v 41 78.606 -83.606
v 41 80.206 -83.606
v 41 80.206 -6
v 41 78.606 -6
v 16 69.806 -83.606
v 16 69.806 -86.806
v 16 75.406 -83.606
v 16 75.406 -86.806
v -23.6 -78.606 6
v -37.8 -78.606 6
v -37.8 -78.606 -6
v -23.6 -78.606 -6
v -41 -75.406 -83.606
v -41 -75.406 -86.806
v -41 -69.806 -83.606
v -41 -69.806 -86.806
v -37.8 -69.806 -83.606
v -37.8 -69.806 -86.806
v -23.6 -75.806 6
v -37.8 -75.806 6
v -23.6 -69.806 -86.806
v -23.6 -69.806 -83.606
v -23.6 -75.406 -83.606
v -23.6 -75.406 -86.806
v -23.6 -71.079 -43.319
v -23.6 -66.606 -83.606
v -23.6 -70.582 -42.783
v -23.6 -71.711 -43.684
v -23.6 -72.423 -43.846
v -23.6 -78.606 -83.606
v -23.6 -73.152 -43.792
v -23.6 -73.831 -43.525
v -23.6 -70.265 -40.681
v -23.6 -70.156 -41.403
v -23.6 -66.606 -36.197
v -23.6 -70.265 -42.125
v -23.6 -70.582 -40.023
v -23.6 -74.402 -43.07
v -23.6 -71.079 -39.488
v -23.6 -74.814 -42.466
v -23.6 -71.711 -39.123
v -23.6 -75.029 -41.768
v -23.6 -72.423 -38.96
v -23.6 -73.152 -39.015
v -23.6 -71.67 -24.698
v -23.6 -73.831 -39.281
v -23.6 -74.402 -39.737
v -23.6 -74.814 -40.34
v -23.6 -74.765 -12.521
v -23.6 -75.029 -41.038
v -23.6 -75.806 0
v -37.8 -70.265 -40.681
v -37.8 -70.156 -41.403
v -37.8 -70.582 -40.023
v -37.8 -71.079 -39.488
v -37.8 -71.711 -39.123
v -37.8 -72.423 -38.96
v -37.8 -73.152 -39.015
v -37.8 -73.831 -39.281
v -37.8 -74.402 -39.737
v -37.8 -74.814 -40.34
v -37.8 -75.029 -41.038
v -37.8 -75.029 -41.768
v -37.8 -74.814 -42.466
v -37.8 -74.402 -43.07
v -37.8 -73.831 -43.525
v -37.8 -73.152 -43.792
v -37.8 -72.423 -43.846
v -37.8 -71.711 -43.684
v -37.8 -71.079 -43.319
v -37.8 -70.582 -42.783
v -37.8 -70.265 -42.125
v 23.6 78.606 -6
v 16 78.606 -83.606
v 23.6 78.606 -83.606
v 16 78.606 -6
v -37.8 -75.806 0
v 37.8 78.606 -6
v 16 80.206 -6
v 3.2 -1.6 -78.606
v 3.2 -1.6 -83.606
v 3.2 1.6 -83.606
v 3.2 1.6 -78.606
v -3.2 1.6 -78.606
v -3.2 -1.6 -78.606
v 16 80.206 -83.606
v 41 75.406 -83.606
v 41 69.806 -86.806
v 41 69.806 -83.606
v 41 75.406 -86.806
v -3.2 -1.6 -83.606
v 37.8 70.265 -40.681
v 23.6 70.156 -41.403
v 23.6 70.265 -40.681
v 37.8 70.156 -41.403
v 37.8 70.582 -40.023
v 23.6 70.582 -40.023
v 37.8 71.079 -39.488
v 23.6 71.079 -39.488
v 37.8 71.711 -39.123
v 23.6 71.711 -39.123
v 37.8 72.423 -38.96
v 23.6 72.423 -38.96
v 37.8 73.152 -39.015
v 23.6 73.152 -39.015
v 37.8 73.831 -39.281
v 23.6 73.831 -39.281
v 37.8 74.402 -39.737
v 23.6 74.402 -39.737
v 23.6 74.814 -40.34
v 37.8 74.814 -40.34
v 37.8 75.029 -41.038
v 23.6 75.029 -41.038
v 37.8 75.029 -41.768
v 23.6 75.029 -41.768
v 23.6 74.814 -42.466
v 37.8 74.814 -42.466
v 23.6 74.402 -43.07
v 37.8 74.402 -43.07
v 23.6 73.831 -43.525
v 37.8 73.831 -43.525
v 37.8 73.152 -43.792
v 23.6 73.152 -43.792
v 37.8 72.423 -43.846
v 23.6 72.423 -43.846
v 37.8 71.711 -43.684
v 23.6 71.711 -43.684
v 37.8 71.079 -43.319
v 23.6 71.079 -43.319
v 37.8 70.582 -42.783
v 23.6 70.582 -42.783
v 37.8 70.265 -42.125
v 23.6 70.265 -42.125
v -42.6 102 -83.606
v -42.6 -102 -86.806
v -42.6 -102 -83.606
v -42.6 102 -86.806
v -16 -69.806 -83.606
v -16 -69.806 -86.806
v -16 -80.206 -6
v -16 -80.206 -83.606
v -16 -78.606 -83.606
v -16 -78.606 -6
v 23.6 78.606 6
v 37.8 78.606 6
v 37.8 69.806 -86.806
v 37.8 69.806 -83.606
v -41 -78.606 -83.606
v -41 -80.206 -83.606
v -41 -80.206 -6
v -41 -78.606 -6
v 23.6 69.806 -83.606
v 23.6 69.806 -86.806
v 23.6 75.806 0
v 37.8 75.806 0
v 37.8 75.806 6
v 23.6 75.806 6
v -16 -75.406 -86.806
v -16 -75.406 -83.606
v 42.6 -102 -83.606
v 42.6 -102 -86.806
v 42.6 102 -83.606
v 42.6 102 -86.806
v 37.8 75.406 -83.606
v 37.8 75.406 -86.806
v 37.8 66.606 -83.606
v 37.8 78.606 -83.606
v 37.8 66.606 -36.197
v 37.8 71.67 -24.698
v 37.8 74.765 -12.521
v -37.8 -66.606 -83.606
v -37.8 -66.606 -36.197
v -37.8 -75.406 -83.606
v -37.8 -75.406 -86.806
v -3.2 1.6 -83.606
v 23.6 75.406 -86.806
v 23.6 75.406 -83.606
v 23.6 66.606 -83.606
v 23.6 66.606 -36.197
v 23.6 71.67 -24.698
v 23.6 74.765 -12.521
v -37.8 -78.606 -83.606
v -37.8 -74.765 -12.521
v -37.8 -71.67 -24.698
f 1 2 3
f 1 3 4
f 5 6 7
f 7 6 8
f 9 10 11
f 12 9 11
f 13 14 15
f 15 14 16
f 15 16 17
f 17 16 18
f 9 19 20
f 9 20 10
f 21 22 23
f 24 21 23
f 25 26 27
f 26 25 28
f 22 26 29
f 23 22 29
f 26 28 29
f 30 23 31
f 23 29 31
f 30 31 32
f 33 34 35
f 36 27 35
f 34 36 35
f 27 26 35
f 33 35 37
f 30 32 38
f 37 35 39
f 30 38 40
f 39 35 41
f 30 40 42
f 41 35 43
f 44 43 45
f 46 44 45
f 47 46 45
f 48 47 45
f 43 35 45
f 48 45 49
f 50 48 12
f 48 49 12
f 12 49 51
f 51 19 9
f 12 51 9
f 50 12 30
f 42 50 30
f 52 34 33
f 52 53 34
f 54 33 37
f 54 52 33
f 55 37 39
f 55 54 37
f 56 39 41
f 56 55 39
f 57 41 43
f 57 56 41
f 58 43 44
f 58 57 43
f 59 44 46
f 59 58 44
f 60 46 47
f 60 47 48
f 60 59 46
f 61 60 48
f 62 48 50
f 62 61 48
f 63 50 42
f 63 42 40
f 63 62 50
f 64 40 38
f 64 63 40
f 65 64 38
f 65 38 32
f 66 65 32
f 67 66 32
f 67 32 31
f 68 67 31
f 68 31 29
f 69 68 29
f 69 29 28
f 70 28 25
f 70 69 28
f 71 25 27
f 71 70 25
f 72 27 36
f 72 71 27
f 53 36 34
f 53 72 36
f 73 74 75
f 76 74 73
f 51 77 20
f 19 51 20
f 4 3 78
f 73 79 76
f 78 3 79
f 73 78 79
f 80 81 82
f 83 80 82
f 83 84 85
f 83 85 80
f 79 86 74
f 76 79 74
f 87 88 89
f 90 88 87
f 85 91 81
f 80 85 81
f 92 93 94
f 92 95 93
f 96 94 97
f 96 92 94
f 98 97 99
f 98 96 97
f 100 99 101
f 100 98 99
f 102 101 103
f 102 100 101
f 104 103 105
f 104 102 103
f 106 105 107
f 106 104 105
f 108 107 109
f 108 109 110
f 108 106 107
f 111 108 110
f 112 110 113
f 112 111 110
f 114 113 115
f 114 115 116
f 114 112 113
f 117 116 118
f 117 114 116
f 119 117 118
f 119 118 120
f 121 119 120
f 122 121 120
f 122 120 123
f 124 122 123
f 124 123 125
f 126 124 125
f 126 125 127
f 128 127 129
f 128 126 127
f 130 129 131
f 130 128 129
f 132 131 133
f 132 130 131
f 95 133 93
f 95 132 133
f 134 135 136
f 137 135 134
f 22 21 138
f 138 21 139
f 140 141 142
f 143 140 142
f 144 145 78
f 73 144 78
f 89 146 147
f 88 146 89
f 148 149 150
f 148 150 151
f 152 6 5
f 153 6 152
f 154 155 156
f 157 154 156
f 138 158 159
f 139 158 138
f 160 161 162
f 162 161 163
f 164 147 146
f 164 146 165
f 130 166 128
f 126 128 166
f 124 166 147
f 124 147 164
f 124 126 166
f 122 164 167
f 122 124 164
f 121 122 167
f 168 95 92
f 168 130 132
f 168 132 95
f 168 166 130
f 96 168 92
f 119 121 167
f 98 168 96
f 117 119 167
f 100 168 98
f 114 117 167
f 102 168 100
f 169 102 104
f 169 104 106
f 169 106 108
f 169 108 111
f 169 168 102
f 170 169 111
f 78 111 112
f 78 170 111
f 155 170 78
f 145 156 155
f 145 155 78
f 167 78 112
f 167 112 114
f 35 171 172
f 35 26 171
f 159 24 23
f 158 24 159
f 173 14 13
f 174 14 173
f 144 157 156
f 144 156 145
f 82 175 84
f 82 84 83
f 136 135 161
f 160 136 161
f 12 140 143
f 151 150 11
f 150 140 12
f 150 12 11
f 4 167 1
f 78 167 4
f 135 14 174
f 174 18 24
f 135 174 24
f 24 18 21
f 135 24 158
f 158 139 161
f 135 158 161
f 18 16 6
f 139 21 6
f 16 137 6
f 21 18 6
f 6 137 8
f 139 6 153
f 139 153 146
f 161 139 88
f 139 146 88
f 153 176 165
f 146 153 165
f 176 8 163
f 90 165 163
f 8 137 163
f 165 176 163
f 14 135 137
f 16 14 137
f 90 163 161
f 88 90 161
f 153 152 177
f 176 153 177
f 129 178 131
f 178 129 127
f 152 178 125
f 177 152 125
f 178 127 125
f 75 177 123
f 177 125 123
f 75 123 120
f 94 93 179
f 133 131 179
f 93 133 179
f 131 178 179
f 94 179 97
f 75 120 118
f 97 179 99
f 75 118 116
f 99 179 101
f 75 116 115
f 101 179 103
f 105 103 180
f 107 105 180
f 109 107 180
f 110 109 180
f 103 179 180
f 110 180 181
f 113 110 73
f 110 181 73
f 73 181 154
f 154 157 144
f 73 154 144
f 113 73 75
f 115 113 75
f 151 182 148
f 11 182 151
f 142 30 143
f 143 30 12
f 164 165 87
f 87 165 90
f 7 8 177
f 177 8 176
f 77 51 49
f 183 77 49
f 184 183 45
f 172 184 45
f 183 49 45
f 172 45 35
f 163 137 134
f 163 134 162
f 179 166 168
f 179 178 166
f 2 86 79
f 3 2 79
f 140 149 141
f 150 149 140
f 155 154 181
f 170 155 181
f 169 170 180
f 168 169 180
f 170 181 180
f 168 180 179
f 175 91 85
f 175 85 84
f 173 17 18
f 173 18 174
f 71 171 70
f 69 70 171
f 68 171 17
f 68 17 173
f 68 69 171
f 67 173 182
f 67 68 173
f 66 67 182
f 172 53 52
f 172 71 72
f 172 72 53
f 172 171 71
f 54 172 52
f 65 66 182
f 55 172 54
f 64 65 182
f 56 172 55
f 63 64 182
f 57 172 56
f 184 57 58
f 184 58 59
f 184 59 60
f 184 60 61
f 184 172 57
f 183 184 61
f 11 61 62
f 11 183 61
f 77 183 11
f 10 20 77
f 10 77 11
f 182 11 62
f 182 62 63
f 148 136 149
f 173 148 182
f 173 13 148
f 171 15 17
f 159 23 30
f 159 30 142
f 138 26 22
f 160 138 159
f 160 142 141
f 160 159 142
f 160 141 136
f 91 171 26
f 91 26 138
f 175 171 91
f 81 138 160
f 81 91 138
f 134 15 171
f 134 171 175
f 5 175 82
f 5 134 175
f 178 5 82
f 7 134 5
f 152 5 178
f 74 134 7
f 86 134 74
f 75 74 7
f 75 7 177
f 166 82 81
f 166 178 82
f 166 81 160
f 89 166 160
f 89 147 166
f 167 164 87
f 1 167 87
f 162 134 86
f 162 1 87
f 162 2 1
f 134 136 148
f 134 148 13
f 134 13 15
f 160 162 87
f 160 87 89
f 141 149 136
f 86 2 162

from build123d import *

# Parameters (mm, degrees)
SKETCH083_W           = 85.2
SKETCH083_H           = 204
SKETCH083_W_2         = 3.2
SKETCH083_H_2         = 5.6
SKETCH083_W_3         = 7.6
PAD041_DEPTH          = 3.2
SKETCH084_R           = 2.45
PAD042_DEPTH          = 7.1
SKETCH085_W           = 1.6
SKETCH085_H           = 77.6064407756
PAD043_DEPTH          = 10.3
PAD043_DEPTH_BACK     = 14.7
POLARPATTERN003_COUNT = 2
SKETCH086_W           = 6.4
SKETCH086_H           = 3.2
PAD044_DEPTH          = 5


with BuildPart() as part:
    # Sketch083 → Pad041 (new body)
    with BuildSketch(Plane.XY.offset(-86.8064407756)):
        Rectangle(SKETCH083_W, SKETCH083_H)
        with Locations((-39.4, -72.6064407756)):
            Rectangle(SKETCH083_W_2, SKETCH083_H_2, mode=Mode.SUBTRACT)
        with Locations((-19.8, -72.6064407756)):
            Rectangle(SKETCH083_W_3, SKETCH083_H_2, mode=Mode.SUBTRACT)
        with Locations((39.4, 72.6064407756)):
            Rectangle(SKETCH083_W_2, SKETCH083_H_2, mode=Mode.SUBTRACT)
        with Locations((19.8, 72.6064407756)):
            Rectangle(SKETCH083_W_3, SKETCH083_H_2, mode=Mode.SUBTRACT)
    extrude(amount=PAD041_DEPTH)

    # Sketch084 → Pad042 (join, symmetric)
    with BuildSketch(Plane.YZ.offset(-30.7)):
        with BuildLine():
            ThreePointArc((-75.8064407756, 0), (-73.4704487226, -18.6737684351), (-66.6064407756, -36.1966643528))
            Line((-66.6064407756, -83.6064407756), (-66.6064407756, -36.1966643528))
            Line((-78.6064407756, -83.6064407756), (-66.6064407756, -83.6064407756))
            Line((-78.6064407756, 6), (-78.6064407756, -83.6064407756))
            Line((-75.8064407756, 6), (-78.6064407756, 6))
            Line((-75.8064407756, 0), (-75.8064407756, 6))
        make_face()
        with Locations((-72.6064407756, -41.4032203878)):
            Circle(SKETCH084_R, mode=Mode.SUBTRACT)
    pad042 = extrude(amount=PAD042_DEPTH, both=True)

    # Sketch085 → Pad043 (join, two sides)
    with BuildSketch(Plane.YZ.offset(-30.7)) as pad043_sk:
        with Locations((-79.4064407756, -44.8032203878)):
            Rectangle(SKETCH085_W, SKETCH085_H)
    pad043 = extrude(amount=-PAD043_DEPTH) + extrude(pad043_sk.sketch, amount=PAD043_DEPTH_BACK)

    # PolarPattern003: Pad042, Pad043 ×2 about axis
    polarpattern003_axis = Axis((0, 0, 0), (0, 0, 1))
    for i in range(1, POLARPATTERN003_COUNT):
        add(pad042.rotate(polarpattern003_axis, i * 360 / POLARPATTERN003_COUNT))
        add(pad043.rotate(polarpattern003_axis, i * 360 / POLARPATTERN003_COUNT))

    # Sketch086 → Pad044 (join)
    with BuildSketch(Plane.XY.offset(-83.6064407756)):
        Rectangle(SKETCH086_W, SKETCH086_H)
    extrude(amount=PAD044_DEPTH)


solid = part.part
